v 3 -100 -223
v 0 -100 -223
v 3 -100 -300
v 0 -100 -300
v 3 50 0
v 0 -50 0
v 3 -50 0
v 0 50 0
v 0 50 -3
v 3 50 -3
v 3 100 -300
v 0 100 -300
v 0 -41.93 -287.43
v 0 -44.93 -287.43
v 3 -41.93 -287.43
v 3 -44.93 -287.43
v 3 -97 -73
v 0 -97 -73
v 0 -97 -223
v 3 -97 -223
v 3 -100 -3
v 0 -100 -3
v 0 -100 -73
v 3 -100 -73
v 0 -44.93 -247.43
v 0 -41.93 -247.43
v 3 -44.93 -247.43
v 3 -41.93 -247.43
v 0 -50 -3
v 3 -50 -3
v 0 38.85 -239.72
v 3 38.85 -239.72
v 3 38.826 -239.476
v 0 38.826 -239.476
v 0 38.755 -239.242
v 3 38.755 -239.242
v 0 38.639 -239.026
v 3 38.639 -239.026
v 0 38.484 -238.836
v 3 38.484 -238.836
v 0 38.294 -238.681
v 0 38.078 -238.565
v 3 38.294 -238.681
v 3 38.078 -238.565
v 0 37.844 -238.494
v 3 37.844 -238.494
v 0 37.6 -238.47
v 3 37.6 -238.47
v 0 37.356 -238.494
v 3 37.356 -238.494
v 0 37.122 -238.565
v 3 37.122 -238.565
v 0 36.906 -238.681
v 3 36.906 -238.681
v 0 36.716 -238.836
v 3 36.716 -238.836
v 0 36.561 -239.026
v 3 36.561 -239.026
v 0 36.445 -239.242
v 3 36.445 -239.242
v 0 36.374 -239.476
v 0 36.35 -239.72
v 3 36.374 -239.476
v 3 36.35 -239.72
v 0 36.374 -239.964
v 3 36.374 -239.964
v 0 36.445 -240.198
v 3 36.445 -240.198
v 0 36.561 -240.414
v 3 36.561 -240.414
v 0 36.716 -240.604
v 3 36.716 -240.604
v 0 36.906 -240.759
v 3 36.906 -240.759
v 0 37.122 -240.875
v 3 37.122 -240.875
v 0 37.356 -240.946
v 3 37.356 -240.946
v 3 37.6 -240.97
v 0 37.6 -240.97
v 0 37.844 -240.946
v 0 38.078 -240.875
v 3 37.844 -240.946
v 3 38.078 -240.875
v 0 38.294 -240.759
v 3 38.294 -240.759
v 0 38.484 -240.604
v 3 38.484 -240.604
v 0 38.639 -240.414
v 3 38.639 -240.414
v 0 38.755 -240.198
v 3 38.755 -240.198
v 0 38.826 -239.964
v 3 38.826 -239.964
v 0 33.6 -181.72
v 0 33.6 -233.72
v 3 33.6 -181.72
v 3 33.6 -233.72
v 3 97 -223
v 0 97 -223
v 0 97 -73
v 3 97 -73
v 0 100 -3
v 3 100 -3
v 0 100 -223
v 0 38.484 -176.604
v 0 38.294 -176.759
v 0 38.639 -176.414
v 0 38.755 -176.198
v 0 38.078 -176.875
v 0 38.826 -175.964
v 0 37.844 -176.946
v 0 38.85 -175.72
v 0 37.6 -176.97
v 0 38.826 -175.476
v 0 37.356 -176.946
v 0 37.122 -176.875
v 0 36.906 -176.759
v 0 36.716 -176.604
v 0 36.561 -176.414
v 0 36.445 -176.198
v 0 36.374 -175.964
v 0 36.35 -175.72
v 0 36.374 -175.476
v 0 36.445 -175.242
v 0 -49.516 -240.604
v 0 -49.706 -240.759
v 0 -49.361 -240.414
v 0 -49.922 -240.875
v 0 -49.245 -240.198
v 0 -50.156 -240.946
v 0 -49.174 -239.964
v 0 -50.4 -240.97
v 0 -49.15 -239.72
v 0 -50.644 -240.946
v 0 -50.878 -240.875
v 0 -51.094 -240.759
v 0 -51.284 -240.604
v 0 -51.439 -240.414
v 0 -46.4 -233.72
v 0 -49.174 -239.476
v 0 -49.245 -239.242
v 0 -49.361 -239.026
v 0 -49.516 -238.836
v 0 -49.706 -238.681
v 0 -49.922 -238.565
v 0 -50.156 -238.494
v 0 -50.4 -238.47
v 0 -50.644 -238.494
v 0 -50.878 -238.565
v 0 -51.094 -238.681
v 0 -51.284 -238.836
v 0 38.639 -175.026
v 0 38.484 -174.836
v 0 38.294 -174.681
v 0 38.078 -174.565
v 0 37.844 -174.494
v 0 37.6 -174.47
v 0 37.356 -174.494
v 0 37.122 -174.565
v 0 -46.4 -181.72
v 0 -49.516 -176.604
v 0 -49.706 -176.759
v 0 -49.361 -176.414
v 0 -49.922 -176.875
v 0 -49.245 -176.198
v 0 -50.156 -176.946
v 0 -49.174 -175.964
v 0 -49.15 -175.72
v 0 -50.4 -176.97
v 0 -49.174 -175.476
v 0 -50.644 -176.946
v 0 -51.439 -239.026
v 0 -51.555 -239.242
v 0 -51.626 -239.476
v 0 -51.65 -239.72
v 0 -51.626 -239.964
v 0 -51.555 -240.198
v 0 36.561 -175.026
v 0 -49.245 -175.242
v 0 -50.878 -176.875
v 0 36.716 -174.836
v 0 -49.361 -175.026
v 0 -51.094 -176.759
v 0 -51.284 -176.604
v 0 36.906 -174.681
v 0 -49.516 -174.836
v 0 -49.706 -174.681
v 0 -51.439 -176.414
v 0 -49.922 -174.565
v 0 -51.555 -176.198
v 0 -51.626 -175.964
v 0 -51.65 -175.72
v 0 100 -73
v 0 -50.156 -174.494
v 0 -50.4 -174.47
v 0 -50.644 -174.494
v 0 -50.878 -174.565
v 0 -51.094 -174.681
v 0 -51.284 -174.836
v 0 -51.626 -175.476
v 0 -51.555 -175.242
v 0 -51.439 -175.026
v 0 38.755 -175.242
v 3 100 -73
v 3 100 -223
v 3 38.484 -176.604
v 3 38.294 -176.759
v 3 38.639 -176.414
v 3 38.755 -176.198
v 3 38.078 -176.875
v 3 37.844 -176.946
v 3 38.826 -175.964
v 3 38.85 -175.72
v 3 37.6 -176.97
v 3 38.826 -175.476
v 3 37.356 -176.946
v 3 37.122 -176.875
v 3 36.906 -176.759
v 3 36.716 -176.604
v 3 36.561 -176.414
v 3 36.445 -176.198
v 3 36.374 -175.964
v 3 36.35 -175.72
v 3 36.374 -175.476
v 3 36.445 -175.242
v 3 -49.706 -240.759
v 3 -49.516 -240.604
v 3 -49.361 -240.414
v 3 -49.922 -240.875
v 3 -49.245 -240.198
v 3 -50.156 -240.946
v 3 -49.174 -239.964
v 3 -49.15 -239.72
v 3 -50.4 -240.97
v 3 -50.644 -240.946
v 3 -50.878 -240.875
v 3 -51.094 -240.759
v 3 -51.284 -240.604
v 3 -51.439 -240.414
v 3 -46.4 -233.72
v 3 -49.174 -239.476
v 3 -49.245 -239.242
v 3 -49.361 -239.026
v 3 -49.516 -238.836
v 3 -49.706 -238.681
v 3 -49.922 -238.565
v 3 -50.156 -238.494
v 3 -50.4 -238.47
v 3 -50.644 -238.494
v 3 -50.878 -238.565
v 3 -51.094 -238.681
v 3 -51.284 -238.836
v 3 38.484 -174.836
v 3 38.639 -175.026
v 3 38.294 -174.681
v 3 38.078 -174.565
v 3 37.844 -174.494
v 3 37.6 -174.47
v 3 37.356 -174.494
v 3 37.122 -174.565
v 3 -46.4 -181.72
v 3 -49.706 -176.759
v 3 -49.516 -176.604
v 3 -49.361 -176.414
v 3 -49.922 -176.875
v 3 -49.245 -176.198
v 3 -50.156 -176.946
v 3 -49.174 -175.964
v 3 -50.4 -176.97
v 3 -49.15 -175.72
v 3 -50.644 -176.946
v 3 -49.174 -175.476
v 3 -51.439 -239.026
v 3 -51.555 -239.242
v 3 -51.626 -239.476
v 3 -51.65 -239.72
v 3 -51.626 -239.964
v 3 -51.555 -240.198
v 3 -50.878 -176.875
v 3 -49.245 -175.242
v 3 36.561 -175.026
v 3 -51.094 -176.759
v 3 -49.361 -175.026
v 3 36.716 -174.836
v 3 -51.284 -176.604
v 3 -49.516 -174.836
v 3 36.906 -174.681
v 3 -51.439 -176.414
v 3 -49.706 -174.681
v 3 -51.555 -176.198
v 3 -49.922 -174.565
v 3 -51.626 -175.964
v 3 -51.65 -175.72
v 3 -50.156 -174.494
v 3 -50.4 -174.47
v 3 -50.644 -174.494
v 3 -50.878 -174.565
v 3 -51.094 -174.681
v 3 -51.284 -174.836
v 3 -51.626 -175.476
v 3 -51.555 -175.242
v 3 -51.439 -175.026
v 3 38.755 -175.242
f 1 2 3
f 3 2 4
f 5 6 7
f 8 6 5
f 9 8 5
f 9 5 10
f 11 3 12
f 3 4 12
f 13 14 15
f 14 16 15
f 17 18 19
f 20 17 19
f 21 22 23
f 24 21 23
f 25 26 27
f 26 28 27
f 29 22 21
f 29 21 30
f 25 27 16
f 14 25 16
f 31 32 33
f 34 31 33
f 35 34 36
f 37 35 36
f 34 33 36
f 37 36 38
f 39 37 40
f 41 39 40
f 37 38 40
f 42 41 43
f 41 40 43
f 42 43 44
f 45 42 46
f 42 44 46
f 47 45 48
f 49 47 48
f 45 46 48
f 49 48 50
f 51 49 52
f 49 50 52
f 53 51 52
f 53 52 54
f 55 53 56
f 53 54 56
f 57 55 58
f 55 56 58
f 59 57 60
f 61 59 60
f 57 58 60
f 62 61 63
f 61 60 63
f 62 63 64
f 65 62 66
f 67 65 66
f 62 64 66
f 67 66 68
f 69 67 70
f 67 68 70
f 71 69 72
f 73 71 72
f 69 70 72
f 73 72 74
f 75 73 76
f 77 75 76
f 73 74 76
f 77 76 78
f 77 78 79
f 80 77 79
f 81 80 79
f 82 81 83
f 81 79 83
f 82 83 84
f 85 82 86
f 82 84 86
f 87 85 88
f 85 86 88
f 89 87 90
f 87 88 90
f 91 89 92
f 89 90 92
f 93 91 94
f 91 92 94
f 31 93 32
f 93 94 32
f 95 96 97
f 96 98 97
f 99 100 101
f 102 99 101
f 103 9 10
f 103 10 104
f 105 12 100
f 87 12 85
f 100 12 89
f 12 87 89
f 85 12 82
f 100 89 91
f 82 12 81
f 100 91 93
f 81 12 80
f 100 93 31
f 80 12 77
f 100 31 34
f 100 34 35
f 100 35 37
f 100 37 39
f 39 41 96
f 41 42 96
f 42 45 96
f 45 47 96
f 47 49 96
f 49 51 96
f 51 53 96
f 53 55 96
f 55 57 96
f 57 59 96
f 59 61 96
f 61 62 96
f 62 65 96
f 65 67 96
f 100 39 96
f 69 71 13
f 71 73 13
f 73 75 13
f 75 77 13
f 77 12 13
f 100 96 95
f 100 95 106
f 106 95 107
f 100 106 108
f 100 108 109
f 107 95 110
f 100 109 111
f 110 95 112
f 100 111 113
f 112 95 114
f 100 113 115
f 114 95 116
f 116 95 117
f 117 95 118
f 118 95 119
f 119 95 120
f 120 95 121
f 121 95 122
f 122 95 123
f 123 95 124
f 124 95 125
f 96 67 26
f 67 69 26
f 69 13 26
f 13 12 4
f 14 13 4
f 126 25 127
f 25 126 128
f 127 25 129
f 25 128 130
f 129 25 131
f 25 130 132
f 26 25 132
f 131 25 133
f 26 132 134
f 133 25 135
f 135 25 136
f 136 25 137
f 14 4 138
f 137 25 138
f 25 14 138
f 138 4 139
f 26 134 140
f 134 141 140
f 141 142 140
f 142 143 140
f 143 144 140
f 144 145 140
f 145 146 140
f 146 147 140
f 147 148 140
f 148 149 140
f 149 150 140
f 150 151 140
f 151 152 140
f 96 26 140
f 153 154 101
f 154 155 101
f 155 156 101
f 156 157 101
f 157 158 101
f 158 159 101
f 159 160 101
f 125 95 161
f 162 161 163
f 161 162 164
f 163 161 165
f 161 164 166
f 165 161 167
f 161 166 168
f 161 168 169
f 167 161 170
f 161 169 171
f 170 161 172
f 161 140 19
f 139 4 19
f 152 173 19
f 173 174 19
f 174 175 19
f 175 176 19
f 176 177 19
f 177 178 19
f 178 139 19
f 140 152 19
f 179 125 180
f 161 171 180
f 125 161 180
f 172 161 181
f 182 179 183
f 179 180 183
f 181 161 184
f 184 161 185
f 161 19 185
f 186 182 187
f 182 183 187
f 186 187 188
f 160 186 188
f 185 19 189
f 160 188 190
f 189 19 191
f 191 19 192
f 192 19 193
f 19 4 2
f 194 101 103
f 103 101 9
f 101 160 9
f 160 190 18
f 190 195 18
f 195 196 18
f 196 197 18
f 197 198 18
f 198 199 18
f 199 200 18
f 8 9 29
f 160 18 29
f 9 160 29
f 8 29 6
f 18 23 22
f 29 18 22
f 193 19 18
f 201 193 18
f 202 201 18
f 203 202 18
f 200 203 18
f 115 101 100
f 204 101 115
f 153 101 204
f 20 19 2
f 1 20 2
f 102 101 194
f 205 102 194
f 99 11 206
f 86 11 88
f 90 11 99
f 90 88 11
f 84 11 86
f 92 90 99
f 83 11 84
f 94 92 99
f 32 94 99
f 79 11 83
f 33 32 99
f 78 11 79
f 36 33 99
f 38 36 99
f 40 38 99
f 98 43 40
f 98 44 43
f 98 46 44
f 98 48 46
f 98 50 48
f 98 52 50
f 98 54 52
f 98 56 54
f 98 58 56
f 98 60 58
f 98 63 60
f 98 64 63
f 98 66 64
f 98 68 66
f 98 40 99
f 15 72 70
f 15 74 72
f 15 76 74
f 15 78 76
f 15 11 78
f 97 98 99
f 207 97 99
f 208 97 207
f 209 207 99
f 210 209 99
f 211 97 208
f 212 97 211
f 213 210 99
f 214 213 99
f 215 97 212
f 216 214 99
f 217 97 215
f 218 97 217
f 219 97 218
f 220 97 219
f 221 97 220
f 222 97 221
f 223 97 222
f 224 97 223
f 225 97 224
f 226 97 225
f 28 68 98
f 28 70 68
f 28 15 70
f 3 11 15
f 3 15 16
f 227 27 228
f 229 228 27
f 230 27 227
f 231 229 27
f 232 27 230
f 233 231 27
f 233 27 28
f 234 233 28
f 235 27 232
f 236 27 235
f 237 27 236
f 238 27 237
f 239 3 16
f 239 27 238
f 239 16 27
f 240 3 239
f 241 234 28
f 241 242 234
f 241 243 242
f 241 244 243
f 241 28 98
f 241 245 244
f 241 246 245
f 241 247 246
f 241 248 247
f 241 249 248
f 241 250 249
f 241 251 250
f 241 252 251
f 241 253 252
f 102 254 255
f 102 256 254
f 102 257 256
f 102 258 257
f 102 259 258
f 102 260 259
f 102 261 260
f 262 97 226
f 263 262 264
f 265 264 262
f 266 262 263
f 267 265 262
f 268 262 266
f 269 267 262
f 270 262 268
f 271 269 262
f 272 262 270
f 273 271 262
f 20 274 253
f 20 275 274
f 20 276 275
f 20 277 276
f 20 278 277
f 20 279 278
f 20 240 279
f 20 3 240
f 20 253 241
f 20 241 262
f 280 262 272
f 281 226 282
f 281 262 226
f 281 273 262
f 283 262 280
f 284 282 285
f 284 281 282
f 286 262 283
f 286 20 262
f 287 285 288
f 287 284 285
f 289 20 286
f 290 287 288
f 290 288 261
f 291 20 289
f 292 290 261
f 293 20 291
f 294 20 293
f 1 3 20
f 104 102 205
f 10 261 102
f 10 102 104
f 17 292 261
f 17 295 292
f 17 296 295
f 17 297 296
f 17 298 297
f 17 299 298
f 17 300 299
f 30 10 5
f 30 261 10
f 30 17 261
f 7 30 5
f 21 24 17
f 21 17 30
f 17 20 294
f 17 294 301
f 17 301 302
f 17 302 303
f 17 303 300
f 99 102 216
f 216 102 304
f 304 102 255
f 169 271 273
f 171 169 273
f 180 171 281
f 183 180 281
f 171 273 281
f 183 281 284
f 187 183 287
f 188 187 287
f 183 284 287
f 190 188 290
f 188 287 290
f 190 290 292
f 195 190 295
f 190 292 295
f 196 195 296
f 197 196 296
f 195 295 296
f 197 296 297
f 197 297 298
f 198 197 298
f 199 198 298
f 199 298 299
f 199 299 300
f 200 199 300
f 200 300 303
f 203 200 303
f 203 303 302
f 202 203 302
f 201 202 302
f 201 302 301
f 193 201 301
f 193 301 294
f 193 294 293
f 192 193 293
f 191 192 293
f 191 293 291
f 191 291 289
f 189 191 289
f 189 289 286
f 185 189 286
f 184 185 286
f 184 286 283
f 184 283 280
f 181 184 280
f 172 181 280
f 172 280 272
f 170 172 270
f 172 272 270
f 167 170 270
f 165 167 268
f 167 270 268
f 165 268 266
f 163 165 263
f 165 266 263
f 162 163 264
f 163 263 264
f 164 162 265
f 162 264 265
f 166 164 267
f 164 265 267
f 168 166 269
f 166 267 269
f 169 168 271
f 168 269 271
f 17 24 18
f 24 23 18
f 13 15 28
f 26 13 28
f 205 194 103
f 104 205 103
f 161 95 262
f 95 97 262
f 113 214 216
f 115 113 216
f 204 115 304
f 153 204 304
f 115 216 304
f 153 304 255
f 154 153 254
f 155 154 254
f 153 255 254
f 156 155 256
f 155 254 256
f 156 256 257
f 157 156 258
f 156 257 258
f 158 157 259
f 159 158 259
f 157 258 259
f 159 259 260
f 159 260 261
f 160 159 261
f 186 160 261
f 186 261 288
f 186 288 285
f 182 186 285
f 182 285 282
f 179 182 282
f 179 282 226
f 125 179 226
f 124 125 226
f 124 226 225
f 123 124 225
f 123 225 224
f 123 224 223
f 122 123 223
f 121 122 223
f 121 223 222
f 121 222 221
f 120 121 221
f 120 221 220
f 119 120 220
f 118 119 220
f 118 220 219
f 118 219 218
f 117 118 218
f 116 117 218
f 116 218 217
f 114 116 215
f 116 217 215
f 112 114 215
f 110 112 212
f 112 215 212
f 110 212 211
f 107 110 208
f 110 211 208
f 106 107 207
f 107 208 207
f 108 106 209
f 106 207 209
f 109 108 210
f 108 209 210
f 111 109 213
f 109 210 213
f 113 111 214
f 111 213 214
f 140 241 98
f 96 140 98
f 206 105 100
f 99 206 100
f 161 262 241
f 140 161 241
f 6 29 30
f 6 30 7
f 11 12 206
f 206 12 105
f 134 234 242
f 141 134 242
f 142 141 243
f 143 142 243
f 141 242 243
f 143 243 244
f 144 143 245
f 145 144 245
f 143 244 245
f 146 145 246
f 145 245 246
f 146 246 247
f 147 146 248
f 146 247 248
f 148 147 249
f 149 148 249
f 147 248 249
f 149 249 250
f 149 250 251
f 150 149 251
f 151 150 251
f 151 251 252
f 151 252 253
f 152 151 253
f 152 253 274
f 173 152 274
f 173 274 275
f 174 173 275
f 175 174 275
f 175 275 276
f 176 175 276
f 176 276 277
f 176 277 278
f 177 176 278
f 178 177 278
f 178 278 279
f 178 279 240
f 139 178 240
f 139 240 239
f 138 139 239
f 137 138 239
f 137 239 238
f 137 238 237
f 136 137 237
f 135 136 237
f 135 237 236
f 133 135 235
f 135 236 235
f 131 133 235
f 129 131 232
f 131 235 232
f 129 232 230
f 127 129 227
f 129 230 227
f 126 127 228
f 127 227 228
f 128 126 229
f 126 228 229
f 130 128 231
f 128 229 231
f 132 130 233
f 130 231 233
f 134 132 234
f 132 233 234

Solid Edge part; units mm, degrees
sketch "Sketch1" plane through (0, 0, 0) normal (1, 0, 0) x (0, 1, 0)
  line L0 (-100, -3) -> (-100, -73)
  line L1 (-100, -73) -> (-97, -73)
  line L2 (-97, -73) -> (-97, -223)
  line L3 (-97, -223) -> (-100, -223)
  line L4 (-100, -223) -> (-100, -300)
  line L5 (-100, -300) -> (0, -300)
  line L6 (0, 0) -> (0, -300)
  line L7 (-50, 0) -> (0, 0)
  line L8 (-50, -3) -> (-50, 0)
  line L9 (-100, -3) -> (-50, -3)
  dimension "D1" = 3
  dimension "D2" = 100
  dimension "D3" = 50
  dimension "D4" = 300
  dimension "D5" = 150
  dimension "D6" = 70
extrude "Protrusion1" add sketch "Sketch1" along normal blind 3
mirror "Mirror1" about plane through (0, 0, 0) normal (0, -1, 0) of "Protrusion1"
sketch "Sketch2" plane through (3, 0, -150) normal (1, 0, 0) x (0, 1, 0)
  circle A0 centre (-50.4, -25.72) radius 1.25
  circle A1 centre (37.6, -25.72) radius 1.25
  circle A2 centre (37.6, -89.72) radius 1.25
  circle A3 centre (-50.4, -89.72) radius 1.25
  line L0 (-41.93, -137.43) -> (-41.93, -97.43)
  line L1 (-41.93, -97.43) -> (-44.93, -97.43)
  line L2 (-44.93, -97.43) -> (-44.93, -137.43)
  line L3 (-44.93, -137.43) -> (-41.93, -137.43)
  line L4 (-46.4, -31.72) -> (-46.4, -83.72)
  line L5 (-46.4, -83.72) -> (33.6, -83.72)
  line L6 (33.6, -83.72) -> (33.6, -31.72)
  line L7 (33.6, -31.72) -> (-46.4, -31.72)
  dimension "D1" = 52
  dimension "D2" = 80
  dimension "D3" = 88
  dimension "D4" = 64
  dimension "D5" = 2.5
  dimension "D6" = 6
  dimension "D7" = 4
  dimension "D8" = 3
  dimension "D9" = 40
  dimension "D10" = 247.43
  dimension "D11" = 58.07
  dimension "D12" = 66.28
  dimension "D13" = 66.4
extrude "Cutout1" cut sketch "Sketch2" against normal up to surface (3 mm away)
properties material "Acier"
